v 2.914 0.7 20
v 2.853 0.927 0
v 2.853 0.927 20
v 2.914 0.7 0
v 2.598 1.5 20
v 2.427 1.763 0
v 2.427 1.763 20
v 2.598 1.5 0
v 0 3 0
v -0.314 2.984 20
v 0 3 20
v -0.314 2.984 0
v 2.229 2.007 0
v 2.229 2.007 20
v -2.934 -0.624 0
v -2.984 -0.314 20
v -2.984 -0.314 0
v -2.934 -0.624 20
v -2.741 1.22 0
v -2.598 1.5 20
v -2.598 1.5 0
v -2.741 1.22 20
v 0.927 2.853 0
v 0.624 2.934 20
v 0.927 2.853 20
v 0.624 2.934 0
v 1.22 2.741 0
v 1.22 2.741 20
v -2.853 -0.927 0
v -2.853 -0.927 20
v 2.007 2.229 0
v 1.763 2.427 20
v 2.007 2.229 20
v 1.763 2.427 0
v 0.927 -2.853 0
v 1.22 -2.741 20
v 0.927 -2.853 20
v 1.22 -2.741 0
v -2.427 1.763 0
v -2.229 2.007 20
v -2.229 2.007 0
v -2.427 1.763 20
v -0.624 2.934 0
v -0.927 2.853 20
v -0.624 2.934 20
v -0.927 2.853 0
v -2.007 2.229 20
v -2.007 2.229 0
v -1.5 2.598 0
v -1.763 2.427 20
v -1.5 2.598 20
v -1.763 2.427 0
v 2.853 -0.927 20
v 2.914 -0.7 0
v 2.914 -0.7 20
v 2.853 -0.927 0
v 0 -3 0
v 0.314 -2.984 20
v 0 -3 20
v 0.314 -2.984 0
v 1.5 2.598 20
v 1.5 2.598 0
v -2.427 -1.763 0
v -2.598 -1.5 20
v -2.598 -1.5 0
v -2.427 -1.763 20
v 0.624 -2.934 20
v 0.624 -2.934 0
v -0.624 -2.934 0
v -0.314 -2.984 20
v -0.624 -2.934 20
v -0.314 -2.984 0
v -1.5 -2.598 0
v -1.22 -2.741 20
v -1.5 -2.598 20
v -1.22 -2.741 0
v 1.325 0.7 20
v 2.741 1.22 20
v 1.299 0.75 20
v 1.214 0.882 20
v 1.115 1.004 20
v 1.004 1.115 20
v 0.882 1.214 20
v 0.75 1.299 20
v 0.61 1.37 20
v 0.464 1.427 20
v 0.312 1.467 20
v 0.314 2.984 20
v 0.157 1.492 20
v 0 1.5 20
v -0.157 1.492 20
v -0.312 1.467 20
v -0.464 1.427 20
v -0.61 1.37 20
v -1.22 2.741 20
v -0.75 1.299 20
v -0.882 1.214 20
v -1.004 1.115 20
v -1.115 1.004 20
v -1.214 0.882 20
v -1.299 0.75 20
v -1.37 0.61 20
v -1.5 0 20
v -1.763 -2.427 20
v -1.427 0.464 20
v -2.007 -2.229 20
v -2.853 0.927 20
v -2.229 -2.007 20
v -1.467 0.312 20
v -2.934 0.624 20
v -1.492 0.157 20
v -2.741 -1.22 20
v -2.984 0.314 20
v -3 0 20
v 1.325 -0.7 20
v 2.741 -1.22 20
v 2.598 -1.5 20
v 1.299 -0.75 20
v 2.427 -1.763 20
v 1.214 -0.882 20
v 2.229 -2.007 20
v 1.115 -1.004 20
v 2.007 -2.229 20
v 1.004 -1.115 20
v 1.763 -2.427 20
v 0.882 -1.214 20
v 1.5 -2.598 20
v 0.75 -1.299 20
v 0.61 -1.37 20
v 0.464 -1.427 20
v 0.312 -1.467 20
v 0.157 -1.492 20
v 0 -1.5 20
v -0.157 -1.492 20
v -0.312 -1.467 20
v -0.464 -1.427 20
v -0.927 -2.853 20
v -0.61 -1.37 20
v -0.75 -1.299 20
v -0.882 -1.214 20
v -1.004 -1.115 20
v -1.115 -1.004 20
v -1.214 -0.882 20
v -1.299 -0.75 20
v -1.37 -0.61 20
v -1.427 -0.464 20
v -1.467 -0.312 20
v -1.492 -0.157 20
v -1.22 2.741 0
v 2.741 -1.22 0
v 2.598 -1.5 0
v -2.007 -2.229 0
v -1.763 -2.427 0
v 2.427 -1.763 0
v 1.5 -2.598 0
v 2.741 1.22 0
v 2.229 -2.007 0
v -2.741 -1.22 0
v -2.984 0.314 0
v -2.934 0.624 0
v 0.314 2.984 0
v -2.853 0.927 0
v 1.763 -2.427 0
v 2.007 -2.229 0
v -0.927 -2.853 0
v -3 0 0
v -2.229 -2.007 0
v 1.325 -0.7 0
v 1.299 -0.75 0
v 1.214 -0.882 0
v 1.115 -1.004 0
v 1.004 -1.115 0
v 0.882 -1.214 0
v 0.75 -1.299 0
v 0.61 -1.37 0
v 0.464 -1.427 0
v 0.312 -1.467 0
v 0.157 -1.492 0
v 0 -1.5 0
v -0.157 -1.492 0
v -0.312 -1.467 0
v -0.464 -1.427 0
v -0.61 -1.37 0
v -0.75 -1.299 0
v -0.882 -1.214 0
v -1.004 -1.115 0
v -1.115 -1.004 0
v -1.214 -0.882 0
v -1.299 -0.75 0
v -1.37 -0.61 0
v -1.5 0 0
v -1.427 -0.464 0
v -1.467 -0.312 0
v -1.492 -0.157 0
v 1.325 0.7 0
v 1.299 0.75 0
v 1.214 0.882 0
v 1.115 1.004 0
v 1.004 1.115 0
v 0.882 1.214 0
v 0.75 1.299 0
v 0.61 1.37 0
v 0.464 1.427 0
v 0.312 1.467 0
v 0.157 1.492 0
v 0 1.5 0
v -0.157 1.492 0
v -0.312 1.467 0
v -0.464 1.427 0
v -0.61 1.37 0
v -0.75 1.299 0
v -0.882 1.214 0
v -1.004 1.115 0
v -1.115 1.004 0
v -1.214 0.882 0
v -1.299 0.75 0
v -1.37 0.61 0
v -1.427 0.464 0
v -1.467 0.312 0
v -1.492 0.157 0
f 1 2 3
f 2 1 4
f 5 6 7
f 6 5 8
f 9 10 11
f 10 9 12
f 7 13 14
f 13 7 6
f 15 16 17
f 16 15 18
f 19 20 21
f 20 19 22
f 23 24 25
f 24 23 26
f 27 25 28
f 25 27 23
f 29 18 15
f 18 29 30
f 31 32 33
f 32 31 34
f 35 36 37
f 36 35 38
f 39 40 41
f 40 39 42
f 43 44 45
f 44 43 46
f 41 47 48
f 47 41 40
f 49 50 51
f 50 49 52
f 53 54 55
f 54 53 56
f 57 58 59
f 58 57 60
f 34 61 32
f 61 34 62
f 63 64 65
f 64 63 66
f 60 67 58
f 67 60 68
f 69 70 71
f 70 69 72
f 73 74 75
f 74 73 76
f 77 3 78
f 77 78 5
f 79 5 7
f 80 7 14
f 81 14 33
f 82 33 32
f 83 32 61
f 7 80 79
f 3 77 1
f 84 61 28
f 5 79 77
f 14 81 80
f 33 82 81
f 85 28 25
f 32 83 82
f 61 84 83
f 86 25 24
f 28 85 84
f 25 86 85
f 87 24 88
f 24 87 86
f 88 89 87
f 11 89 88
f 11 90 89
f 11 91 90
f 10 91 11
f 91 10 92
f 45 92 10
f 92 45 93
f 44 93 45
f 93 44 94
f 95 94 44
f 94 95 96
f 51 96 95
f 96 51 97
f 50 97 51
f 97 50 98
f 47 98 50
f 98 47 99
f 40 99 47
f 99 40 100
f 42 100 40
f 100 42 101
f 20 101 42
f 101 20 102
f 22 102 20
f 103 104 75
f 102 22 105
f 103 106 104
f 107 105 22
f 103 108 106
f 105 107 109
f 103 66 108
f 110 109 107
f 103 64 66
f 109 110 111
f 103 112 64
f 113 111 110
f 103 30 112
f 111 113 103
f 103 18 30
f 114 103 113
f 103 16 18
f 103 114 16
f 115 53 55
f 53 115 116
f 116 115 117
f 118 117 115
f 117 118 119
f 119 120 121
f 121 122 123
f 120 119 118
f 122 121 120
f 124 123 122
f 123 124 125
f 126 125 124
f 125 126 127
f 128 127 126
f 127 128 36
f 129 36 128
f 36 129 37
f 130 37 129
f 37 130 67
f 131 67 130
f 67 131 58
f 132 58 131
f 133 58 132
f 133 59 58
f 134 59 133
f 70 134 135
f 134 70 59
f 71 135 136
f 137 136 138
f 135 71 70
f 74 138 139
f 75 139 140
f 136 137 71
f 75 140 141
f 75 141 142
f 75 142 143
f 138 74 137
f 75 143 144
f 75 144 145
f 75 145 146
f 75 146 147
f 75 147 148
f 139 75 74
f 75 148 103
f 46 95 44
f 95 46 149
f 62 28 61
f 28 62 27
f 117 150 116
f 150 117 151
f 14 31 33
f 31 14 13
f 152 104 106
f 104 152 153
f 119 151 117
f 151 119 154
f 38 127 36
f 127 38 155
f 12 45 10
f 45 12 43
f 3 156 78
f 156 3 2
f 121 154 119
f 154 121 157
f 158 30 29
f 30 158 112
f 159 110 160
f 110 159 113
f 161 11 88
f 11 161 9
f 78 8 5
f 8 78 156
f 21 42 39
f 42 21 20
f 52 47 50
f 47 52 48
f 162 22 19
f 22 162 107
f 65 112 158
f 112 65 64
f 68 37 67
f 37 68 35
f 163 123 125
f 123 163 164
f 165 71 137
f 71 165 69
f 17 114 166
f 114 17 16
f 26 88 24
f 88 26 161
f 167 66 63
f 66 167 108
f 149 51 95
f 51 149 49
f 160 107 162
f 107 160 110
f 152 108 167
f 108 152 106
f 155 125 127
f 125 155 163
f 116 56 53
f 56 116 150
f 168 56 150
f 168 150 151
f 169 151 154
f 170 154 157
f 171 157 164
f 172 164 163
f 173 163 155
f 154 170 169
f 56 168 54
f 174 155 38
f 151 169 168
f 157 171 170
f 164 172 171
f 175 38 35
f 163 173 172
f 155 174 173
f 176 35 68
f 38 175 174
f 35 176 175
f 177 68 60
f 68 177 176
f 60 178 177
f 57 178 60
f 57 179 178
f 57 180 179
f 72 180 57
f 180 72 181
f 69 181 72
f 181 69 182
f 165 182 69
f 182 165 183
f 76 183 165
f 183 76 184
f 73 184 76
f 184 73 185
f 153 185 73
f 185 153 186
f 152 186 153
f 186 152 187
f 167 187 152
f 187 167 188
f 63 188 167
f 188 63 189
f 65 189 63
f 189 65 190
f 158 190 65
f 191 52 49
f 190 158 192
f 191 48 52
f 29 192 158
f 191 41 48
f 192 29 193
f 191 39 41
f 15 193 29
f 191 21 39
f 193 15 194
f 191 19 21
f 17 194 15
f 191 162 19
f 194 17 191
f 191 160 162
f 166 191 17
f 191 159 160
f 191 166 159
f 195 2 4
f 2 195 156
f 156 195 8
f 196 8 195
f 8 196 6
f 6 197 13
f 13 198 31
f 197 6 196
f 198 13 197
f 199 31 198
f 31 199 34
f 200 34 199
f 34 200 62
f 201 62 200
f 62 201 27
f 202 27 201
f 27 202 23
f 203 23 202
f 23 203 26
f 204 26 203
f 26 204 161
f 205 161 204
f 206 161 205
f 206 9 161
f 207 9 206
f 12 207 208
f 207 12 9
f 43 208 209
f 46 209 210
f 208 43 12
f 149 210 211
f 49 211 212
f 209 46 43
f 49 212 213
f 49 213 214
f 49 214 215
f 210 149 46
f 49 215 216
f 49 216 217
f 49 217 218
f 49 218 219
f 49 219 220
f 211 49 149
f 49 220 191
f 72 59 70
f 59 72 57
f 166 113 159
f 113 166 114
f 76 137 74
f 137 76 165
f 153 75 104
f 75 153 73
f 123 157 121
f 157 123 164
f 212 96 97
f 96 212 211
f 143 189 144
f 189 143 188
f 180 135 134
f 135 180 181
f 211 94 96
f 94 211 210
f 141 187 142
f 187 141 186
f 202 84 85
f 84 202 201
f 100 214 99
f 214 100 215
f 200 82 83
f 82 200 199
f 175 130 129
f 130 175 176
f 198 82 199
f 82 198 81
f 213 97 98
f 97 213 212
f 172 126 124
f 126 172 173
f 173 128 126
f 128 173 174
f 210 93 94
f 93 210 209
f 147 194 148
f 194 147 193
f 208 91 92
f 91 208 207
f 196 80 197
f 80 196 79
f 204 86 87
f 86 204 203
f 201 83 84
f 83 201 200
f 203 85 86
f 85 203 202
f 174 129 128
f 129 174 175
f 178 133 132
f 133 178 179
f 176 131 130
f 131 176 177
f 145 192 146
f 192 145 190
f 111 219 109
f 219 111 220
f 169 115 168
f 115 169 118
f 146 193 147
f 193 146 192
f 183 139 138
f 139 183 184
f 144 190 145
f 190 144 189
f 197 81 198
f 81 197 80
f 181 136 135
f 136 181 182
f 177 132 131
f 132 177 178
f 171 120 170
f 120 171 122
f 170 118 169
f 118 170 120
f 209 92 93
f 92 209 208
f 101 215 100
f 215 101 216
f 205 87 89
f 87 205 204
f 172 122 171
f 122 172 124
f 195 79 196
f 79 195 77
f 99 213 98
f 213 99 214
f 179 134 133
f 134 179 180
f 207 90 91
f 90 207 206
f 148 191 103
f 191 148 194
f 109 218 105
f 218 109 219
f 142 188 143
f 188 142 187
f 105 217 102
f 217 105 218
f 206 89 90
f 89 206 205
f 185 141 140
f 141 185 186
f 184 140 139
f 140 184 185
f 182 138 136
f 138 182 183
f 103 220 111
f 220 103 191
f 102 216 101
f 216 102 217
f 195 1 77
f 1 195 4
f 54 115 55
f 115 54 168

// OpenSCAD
// Slotted roll pin.
$fn = 60;
eps = 0.02;
inner_d = 3;
outer_d = 6;
length = 20;
slot = 1.4;
difference() {
    cylinder(d=outer_d,h=length);
    translate([0,0,-eps]) cylinder(d=inner_d,h=length+2*eps);
    translate([0,-slot/2,-eps]) cube([outer_d/2+eps,slot,length+2*eps]);
}
